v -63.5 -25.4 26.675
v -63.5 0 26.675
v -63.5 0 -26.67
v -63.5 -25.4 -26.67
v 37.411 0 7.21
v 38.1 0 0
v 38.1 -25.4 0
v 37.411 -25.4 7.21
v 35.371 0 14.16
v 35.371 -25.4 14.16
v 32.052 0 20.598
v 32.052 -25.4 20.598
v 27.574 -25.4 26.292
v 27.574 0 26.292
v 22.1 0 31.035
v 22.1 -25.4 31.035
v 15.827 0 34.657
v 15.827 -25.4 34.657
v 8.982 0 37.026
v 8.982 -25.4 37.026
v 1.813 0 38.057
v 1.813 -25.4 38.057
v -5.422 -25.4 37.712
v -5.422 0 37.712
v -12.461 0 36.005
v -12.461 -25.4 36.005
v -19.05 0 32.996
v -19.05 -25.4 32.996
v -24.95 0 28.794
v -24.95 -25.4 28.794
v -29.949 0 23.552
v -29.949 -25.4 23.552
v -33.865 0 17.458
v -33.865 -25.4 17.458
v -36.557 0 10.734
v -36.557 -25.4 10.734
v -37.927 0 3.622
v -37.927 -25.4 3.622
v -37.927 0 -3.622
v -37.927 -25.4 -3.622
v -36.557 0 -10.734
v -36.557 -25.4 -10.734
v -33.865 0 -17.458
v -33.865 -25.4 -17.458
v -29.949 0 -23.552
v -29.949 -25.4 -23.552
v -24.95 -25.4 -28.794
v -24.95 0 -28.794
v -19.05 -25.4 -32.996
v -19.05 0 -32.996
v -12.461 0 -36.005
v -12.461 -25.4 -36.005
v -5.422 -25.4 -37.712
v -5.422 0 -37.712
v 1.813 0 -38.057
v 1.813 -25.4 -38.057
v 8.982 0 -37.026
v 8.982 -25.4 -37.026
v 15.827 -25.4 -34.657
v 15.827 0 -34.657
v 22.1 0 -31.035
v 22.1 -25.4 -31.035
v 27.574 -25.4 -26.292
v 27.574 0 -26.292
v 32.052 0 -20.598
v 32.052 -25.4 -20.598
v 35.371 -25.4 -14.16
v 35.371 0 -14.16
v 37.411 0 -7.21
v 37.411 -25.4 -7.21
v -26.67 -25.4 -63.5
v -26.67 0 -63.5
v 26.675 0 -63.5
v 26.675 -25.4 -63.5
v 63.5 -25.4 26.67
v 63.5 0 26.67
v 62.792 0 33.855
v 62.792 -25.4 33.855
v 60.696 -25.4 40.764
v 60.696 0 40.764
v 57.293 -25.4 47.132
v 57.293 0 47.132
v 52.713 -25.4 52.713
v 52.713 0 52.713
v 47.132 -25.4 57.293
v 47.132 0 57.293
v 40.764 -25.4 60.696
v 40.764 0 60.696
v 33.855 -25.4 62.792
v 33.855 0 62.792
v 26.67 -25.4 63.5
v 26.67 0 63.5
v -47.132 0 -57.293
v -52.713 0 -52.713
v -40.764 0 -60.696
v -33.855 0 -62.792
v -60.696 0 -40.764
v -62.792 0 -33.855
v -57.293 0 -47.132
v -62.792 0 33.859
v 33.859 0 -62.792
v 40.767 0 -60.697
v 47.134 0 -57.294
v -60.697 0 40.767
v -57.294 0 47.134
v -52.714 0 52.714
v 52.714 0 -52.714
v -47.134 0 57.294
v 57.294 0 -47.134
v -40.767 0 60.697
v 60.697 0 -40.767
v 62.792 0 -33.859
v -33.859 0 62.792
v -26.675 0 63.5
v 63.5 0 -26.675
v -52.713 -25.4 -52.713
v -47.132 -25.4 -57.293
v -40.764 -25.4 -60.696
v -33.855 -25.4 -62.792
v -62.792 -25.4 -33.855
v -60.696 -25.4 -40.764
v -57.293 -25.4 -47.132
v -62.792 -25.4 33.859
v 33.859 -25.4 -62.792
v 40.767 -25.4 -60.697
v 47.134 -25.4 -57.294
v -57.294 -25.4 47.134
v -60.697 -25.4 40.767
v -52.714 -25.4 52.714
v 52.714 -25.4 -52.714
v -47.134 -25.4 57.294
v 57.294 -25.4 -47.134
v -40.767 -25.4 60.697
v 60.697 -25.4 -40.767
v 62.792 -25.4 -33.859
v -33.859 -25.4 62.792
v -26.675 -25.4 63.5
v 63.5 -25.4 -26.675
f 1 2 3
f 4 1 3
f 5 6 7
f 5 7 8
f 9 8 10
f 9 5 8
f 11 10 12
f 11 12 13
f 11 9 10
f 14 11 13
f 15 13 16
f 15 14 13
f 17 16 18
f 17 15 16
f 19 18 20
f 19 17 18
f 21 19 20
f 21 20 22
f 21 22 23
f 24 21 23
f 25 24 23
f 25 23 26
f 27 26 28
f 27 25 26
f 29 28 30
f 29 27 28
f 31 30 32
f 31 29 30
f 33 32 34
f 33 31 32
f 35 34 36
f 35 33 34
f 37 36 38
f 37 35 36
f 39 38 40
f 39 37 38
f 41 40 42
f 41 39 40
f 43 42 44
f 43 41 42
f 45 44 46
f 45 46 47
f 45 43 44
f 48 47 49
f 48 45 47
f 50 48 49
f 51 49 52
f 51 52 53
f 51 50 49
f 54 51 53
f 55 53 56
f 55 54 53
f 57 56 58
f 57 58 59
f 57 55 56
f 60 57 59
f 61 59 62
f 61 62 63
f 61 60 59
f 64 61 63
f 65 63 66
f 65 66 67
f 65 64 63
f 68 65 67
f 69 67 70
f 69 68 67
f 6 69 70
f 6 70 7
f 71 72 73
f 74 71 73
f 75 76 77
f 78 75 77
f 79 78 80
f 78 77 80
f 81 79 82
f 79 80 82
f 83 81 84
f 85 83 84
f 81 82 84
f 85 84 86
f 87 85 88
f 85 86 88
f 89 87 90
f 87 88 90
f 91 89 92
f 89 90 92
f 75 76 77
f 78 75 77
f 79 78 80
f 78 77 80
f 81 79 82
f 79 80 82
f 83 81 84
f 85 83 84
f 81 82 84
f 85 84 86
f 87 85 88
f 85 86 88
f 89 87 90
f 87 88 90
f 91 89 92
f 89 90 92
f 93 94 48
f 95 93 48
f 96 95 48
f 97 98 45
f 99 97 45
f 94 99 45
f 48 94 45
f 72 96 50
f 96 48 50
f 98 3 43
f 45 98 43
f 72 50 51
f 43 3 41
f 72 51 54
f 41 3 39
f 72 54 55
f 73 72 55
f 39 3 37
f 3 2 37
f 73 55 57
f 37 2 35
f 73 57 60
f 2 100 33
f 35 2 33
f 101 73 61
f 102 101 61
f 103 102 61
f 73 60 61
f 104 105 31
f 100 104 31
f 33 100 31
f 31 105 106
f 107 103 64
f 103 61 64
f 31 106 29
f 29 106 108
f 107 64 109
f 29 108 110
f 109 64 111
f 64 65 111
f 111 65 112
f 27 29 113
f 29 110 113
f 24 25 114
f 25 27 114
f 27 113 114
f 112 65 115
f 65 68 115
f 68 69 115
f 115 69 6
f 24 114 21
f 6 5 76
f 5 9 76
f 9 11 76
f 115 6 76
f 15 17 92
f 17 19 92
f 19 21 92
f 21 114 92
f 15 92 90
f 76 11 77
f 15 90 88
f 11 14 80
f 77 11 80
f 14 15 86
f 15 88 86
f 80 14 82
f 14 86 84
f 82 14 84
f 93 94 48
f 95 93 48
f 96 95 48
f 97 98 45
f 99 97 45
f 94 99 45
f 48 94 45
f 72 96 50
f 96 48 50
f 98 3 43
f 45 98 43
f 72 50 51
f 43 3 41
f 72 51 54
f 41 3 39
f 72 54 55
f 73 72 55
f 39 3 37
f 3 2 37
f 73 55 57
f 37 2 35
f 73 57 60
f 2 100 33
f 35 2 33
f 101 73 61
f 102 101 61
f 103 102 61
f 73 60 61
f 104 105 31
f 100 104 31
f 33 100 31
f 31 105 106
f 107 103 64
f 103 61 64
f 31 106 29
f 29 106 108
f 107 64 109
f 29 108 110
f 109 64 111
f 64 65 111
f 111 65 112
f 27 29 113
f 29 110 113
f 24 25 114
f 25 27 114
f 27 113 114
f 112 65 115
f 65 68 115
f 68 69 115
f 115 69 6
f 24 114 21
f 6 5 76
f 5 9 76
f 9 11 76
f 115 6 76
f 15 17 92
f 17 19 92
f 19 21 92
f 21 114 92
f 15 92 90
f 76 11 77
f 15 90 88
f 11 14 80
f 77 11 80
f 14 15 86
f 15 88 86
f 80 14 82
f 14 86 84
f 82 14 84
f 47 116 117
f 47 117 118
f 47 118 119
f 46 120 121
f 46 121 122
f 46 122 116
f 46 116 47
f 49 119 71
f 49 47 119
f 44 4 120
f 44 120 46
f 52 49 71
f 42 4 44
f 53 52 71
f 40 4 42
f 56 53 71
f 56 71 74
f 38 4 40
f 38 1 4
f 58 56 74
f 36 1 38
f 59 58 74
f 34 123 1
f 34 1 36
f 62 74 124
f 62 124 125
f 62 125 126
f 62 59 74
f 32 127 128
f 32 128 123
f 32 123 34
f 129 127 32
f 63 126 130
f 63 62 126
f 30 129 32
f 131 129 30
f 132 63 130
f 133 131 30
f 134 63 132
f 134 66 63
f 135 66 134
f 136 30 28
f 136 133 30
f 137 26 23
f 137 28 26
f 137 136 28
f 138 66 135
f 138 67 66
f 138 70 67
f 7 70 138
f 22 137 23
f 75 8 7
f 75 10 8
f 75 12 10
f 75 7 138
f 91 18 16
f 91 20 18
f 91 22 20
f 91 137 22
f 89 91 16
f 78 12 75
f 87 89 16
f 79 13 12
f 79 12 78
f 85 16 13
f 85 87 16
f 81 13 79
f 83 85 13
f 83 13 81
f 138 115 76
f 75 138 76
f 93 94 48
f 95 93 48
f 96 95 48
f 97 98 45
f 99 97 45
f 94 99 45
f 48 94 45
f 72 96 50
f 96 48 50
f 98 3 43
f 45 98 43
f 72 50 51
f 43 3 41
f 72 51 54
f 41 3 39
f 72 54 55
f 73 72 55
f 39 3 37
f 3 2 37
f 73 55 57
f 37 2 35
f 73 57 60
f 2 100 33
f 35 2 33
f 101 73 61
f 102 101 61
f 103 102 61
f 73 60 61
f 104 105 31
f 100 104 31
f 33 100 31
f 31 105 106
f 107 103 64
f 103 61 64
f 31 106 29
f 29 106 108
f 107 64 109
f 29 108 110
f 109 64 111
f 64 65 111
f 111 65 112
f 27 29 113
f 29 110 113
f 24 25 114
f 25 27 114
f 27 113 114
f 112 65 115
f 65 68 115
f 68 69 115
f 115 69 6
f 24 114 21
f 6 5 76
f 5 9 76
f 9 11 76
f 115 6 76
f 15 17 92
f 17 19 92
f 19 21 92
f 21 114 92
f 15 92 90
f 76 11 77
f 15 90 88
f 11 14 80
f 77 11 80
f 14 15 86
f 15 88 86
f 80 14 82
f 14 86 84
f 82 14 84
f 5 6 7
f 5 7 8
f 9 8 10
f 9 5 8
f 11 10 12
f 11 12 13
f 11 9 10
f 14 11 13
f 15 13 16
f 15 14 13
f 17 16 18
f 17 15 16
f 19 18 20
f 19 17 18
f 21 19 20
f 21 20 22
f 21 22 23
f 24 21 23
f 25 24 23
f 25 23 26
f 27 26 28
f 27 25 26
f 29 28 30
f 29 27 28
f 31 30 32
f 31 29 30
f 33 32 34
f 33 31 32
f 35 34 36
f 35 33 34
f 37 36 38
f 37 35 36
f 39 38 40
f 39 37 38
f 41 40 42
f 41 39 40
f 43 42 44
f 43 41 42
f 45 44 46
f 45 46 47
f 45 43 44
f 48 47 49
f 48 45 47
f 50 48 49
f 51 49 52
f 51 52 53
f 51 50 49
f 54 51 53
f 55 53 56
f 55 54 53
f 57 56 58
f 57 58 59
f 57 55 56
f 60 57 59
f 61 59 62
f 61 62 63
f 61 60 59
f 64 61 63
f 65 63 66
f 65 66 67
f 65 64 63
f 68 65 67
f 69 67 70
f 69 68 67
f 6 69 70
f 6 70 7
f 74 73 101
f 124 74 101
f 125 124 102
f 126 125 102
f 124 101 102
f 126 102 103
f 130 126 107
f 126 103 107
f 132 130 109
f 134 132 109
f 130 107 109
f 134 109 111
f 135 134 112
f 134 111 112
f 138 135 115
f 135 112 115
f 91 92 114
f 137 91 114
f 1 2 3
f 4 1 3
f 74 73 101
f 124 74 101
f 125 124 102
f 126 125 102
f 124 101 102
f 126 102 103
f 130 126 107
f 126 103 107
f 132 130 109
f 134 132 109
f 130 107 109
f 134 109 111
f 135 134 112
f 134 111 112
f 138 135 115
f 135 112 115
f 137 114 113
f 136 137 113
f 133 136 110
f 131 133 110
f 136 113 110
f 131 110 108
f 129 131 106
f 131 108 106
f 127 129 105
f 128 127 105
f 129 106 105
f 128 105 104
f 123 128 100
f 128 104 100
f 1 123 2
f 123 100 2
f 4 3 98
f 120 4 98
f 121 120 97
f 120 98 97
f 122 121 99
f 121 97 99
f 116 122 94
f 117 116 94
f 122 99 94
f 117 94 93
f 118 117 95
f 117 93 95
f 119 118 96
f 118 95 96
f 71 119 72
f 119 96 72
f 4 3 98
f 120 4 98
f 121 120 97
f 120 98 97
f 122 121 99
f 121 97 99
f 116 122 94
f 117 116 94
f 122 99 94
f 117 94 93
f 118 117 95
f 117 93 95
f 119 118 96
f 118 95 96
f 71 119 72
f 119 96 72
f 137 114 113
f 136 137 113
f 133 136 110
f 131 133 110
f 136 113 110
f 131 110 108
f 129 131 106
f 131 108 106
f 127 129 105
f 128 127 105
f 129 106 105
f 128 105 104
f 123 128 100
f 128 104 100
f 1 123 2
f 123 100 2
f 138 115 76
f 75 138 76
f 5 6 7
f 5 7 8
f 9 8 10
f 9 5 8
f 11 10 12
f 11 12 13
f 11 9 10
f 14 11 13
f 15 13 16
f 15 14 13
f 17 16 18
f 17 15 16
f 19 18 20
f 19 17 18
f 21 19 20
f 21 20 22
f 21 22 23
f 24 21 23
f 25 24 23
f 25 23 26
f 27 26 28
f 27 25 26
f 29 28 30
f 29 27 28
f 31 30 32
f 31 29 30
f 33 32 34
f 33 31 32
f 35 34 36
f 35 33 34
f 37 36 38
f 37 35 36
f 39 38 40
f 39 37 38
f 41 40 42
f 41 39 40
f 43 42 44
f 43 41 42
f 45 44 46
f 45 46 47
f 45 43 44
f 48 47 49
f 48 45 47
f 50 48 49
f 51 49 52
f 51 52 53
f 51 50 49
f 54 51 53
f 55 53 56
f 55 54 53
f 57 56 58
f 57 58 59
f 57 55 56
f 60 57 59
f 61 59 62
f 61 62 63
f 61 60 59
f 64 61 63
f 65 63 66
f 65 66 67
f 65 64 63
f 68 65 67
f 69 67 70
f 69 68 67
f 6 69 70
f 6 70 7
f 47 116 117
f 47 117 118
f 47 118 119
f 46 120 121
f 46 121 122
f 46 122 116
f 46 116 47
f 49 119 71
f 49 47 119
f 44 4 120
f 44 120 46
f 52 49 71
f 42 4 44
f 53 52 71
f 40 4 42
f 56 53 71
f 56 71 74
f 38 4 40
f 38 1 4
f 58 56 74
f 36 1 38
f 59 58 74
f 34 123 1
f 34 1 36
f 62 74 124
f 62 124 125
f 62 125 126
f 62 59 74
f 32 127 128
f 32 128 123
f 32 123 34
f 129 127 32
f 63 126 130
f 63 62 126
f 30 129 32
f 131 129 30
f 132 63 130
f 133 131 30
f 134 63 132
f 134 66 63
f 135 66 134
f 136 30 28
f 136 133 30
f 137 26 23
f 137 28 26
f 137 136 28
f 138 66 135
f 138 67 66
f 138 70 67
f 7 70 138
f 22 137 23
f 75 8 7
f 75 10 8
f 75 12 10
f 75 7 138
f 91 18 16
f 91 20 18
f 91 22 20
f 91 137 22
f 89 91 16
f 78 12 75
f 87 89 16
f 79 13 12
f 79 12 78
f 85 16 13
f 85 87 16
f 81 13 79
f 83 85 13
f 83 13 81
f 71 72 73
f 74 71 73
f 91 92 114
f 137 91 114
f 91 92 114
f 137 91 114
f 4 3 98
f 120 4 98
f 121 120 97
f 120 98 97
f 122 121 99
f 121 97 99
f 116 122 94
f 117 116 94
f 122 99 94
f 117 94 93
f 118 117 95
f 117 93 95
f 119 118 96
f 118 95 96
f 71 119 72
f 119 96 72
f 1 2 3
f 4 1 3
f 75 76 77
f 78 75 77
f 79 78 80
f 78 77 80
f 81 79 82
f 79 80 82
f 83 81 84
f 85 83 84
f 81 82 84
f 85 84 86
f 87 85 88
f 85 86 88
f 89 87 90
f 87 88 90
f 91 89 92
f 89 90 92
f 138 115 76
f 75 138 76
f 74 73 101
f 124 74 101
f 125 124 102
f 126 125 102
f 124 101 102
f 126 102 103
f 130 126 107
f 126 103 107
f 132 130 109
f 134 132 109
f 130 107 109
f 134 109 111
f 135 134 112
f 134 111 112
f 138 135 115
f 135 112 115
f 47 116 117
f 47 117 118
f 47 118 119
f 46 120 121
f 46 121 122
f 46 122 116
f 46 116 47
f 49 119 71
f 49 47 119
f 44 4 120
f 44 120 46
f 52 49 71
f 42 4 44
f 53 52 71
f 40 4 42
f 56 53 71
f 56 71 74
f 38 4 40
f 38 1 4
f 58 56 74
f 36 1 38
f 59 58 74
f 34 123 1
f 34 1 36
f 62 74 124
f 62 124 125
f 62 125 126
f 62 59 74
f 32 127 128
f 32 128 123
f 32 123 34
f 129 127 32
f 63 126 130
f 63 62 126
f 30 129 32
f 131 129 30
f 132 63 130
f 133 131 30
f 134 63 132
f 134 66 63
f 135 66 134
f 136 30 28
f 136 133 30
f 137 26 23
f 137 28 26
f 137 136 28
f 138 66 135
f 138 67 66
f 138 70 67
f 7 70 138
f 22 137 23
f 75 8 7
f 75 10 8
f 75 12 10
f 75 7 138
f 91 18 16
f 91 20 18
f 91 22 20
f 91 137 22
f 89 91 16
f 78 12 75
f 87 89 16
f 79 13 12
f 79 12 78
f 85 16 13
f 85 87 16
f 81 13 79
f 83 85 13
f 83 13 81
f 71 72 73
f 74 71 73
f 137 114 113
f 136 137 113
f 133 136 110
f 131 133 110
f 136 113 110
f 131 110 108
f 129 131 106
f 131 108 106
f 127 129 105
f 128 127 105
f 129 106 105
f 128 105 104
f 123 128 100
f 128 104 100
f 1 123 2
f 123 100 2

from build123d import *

# Parameters (mm, degrees)
F0_R     = 38.1
F2_DEPTH = 25.4
F3_DEPTH = 25.4
F4_DEPTH = 25.4


# Not quite as in the source:
# - the program builds the solid bodies; features that only make, move or delete a surface that nothing else refers to are left out


with BuildPart() as f2:
    # F0 (on Front) → F2 (new body)
    with BuildSketch(Plane.XZ):
        with BuildLine():
            Line((26.67, 63.5), (-26.6751700985, 63.5))
            ThreePointArc((-26.6751700985, 63.5), (-52.7142570379, 52.7142570379), (-63.5, 26.6751700985))
            Line((-63.5, 26.6751700985), (-63.5, -26.67))
            ThreePointArc((-63.5, -26.67), (-52.7127427511, -52.7127427511), (-26.67, -63.5))
            Line((-26.67, -63.5), (26.6751700985, -63.5))
            ThreePointArc((26.6751700985, -63.5), (52.7142570379, -52.7142570379), (63.5, -26.6751700985))
            Line((63.5, -26.6751700985), (63.5, 26.67))
            ThreePointArc((63.5, 26.67), (52.7127427511, 52.7127427511), (26.67, 63.5))
        make_face()
        Circle(F0_R, mode=Mode.SUBTRACT)
    extrude(amount=F2_DEPTH)


with BuildPart() as f3:
    # F0 (on Front) → F3 (new body)
    with BuildSketch(Plane.XZ):
        with BuildLine():
            Line((26.67, 63.5), (-26.6751700985, 63.5))
            ThreePointArc((-26.6751700985, 63.5), (-52.7142570379, 52.7142570379), (-63.5, 26.6751700985))
            Line((-63.5, 26.6751700985), (-63.5, -26.67))
            ThreePointArc((-63.5, -26.67), (-52.7127427511, -52.7127427511), (-26.67, -63.5))
            Line((-26.67, -63.5), (26.6751700985, -63.5))
            ThreePointArc((26.6751700985, -63.5), (52.7142570379, -52.7142570379), (63.5, -26.6751700985))
            Line((63.5, -26.6751700985), (63.5, 26.67))
            ThreePointArc((63.5, 26.67), (52.7127427511, 52.7127427511), (26.67, 63.5))
        make_face()
        Circle(F0_R, mode=Mode.SUBTRACT)
    extrude(amount=F3_DEPTH)


with BuildPart() as f4:
    # F0 (on Front) → F4 (new body)
    with BuildSketch(Plane.XZ):
        with BuildLine():
            Line((26.67, 63.5), (-26.6751700985, 63.5))
            ThreePointArc((-26.6751700985, 63.5), (-52.7142570379, 52.7142570379), (-63.5, 26.6751700985))
            Line((-63.5, 26.6751700985), (-63.5, -26.67))
            ThreePointArc((-63.5, -26.67), (-52.7127427511, -52.7127427511), (-26.67, -63.5))
            Line((-26.67, -63.5), (26.6751700985, -63.5))
            ThreePointArc((26.6751700985, -63.5), (52.7142570379, -52.7142570379), (63.5, -26.6751700985))
            Line((63.5, -26.6751700985), (63.5, 26.67))
            ThreePointArc((63.5, 26.67), (52.7127427511, 52.7127427511), (26.67, 63.5))
        make_face()
        Circle(F0_R, mode=Mode.SUBTRACT)
    extrude(amount=F4_DEPTH)


solid = Compound([f2.part, f3.part, f4.part])
